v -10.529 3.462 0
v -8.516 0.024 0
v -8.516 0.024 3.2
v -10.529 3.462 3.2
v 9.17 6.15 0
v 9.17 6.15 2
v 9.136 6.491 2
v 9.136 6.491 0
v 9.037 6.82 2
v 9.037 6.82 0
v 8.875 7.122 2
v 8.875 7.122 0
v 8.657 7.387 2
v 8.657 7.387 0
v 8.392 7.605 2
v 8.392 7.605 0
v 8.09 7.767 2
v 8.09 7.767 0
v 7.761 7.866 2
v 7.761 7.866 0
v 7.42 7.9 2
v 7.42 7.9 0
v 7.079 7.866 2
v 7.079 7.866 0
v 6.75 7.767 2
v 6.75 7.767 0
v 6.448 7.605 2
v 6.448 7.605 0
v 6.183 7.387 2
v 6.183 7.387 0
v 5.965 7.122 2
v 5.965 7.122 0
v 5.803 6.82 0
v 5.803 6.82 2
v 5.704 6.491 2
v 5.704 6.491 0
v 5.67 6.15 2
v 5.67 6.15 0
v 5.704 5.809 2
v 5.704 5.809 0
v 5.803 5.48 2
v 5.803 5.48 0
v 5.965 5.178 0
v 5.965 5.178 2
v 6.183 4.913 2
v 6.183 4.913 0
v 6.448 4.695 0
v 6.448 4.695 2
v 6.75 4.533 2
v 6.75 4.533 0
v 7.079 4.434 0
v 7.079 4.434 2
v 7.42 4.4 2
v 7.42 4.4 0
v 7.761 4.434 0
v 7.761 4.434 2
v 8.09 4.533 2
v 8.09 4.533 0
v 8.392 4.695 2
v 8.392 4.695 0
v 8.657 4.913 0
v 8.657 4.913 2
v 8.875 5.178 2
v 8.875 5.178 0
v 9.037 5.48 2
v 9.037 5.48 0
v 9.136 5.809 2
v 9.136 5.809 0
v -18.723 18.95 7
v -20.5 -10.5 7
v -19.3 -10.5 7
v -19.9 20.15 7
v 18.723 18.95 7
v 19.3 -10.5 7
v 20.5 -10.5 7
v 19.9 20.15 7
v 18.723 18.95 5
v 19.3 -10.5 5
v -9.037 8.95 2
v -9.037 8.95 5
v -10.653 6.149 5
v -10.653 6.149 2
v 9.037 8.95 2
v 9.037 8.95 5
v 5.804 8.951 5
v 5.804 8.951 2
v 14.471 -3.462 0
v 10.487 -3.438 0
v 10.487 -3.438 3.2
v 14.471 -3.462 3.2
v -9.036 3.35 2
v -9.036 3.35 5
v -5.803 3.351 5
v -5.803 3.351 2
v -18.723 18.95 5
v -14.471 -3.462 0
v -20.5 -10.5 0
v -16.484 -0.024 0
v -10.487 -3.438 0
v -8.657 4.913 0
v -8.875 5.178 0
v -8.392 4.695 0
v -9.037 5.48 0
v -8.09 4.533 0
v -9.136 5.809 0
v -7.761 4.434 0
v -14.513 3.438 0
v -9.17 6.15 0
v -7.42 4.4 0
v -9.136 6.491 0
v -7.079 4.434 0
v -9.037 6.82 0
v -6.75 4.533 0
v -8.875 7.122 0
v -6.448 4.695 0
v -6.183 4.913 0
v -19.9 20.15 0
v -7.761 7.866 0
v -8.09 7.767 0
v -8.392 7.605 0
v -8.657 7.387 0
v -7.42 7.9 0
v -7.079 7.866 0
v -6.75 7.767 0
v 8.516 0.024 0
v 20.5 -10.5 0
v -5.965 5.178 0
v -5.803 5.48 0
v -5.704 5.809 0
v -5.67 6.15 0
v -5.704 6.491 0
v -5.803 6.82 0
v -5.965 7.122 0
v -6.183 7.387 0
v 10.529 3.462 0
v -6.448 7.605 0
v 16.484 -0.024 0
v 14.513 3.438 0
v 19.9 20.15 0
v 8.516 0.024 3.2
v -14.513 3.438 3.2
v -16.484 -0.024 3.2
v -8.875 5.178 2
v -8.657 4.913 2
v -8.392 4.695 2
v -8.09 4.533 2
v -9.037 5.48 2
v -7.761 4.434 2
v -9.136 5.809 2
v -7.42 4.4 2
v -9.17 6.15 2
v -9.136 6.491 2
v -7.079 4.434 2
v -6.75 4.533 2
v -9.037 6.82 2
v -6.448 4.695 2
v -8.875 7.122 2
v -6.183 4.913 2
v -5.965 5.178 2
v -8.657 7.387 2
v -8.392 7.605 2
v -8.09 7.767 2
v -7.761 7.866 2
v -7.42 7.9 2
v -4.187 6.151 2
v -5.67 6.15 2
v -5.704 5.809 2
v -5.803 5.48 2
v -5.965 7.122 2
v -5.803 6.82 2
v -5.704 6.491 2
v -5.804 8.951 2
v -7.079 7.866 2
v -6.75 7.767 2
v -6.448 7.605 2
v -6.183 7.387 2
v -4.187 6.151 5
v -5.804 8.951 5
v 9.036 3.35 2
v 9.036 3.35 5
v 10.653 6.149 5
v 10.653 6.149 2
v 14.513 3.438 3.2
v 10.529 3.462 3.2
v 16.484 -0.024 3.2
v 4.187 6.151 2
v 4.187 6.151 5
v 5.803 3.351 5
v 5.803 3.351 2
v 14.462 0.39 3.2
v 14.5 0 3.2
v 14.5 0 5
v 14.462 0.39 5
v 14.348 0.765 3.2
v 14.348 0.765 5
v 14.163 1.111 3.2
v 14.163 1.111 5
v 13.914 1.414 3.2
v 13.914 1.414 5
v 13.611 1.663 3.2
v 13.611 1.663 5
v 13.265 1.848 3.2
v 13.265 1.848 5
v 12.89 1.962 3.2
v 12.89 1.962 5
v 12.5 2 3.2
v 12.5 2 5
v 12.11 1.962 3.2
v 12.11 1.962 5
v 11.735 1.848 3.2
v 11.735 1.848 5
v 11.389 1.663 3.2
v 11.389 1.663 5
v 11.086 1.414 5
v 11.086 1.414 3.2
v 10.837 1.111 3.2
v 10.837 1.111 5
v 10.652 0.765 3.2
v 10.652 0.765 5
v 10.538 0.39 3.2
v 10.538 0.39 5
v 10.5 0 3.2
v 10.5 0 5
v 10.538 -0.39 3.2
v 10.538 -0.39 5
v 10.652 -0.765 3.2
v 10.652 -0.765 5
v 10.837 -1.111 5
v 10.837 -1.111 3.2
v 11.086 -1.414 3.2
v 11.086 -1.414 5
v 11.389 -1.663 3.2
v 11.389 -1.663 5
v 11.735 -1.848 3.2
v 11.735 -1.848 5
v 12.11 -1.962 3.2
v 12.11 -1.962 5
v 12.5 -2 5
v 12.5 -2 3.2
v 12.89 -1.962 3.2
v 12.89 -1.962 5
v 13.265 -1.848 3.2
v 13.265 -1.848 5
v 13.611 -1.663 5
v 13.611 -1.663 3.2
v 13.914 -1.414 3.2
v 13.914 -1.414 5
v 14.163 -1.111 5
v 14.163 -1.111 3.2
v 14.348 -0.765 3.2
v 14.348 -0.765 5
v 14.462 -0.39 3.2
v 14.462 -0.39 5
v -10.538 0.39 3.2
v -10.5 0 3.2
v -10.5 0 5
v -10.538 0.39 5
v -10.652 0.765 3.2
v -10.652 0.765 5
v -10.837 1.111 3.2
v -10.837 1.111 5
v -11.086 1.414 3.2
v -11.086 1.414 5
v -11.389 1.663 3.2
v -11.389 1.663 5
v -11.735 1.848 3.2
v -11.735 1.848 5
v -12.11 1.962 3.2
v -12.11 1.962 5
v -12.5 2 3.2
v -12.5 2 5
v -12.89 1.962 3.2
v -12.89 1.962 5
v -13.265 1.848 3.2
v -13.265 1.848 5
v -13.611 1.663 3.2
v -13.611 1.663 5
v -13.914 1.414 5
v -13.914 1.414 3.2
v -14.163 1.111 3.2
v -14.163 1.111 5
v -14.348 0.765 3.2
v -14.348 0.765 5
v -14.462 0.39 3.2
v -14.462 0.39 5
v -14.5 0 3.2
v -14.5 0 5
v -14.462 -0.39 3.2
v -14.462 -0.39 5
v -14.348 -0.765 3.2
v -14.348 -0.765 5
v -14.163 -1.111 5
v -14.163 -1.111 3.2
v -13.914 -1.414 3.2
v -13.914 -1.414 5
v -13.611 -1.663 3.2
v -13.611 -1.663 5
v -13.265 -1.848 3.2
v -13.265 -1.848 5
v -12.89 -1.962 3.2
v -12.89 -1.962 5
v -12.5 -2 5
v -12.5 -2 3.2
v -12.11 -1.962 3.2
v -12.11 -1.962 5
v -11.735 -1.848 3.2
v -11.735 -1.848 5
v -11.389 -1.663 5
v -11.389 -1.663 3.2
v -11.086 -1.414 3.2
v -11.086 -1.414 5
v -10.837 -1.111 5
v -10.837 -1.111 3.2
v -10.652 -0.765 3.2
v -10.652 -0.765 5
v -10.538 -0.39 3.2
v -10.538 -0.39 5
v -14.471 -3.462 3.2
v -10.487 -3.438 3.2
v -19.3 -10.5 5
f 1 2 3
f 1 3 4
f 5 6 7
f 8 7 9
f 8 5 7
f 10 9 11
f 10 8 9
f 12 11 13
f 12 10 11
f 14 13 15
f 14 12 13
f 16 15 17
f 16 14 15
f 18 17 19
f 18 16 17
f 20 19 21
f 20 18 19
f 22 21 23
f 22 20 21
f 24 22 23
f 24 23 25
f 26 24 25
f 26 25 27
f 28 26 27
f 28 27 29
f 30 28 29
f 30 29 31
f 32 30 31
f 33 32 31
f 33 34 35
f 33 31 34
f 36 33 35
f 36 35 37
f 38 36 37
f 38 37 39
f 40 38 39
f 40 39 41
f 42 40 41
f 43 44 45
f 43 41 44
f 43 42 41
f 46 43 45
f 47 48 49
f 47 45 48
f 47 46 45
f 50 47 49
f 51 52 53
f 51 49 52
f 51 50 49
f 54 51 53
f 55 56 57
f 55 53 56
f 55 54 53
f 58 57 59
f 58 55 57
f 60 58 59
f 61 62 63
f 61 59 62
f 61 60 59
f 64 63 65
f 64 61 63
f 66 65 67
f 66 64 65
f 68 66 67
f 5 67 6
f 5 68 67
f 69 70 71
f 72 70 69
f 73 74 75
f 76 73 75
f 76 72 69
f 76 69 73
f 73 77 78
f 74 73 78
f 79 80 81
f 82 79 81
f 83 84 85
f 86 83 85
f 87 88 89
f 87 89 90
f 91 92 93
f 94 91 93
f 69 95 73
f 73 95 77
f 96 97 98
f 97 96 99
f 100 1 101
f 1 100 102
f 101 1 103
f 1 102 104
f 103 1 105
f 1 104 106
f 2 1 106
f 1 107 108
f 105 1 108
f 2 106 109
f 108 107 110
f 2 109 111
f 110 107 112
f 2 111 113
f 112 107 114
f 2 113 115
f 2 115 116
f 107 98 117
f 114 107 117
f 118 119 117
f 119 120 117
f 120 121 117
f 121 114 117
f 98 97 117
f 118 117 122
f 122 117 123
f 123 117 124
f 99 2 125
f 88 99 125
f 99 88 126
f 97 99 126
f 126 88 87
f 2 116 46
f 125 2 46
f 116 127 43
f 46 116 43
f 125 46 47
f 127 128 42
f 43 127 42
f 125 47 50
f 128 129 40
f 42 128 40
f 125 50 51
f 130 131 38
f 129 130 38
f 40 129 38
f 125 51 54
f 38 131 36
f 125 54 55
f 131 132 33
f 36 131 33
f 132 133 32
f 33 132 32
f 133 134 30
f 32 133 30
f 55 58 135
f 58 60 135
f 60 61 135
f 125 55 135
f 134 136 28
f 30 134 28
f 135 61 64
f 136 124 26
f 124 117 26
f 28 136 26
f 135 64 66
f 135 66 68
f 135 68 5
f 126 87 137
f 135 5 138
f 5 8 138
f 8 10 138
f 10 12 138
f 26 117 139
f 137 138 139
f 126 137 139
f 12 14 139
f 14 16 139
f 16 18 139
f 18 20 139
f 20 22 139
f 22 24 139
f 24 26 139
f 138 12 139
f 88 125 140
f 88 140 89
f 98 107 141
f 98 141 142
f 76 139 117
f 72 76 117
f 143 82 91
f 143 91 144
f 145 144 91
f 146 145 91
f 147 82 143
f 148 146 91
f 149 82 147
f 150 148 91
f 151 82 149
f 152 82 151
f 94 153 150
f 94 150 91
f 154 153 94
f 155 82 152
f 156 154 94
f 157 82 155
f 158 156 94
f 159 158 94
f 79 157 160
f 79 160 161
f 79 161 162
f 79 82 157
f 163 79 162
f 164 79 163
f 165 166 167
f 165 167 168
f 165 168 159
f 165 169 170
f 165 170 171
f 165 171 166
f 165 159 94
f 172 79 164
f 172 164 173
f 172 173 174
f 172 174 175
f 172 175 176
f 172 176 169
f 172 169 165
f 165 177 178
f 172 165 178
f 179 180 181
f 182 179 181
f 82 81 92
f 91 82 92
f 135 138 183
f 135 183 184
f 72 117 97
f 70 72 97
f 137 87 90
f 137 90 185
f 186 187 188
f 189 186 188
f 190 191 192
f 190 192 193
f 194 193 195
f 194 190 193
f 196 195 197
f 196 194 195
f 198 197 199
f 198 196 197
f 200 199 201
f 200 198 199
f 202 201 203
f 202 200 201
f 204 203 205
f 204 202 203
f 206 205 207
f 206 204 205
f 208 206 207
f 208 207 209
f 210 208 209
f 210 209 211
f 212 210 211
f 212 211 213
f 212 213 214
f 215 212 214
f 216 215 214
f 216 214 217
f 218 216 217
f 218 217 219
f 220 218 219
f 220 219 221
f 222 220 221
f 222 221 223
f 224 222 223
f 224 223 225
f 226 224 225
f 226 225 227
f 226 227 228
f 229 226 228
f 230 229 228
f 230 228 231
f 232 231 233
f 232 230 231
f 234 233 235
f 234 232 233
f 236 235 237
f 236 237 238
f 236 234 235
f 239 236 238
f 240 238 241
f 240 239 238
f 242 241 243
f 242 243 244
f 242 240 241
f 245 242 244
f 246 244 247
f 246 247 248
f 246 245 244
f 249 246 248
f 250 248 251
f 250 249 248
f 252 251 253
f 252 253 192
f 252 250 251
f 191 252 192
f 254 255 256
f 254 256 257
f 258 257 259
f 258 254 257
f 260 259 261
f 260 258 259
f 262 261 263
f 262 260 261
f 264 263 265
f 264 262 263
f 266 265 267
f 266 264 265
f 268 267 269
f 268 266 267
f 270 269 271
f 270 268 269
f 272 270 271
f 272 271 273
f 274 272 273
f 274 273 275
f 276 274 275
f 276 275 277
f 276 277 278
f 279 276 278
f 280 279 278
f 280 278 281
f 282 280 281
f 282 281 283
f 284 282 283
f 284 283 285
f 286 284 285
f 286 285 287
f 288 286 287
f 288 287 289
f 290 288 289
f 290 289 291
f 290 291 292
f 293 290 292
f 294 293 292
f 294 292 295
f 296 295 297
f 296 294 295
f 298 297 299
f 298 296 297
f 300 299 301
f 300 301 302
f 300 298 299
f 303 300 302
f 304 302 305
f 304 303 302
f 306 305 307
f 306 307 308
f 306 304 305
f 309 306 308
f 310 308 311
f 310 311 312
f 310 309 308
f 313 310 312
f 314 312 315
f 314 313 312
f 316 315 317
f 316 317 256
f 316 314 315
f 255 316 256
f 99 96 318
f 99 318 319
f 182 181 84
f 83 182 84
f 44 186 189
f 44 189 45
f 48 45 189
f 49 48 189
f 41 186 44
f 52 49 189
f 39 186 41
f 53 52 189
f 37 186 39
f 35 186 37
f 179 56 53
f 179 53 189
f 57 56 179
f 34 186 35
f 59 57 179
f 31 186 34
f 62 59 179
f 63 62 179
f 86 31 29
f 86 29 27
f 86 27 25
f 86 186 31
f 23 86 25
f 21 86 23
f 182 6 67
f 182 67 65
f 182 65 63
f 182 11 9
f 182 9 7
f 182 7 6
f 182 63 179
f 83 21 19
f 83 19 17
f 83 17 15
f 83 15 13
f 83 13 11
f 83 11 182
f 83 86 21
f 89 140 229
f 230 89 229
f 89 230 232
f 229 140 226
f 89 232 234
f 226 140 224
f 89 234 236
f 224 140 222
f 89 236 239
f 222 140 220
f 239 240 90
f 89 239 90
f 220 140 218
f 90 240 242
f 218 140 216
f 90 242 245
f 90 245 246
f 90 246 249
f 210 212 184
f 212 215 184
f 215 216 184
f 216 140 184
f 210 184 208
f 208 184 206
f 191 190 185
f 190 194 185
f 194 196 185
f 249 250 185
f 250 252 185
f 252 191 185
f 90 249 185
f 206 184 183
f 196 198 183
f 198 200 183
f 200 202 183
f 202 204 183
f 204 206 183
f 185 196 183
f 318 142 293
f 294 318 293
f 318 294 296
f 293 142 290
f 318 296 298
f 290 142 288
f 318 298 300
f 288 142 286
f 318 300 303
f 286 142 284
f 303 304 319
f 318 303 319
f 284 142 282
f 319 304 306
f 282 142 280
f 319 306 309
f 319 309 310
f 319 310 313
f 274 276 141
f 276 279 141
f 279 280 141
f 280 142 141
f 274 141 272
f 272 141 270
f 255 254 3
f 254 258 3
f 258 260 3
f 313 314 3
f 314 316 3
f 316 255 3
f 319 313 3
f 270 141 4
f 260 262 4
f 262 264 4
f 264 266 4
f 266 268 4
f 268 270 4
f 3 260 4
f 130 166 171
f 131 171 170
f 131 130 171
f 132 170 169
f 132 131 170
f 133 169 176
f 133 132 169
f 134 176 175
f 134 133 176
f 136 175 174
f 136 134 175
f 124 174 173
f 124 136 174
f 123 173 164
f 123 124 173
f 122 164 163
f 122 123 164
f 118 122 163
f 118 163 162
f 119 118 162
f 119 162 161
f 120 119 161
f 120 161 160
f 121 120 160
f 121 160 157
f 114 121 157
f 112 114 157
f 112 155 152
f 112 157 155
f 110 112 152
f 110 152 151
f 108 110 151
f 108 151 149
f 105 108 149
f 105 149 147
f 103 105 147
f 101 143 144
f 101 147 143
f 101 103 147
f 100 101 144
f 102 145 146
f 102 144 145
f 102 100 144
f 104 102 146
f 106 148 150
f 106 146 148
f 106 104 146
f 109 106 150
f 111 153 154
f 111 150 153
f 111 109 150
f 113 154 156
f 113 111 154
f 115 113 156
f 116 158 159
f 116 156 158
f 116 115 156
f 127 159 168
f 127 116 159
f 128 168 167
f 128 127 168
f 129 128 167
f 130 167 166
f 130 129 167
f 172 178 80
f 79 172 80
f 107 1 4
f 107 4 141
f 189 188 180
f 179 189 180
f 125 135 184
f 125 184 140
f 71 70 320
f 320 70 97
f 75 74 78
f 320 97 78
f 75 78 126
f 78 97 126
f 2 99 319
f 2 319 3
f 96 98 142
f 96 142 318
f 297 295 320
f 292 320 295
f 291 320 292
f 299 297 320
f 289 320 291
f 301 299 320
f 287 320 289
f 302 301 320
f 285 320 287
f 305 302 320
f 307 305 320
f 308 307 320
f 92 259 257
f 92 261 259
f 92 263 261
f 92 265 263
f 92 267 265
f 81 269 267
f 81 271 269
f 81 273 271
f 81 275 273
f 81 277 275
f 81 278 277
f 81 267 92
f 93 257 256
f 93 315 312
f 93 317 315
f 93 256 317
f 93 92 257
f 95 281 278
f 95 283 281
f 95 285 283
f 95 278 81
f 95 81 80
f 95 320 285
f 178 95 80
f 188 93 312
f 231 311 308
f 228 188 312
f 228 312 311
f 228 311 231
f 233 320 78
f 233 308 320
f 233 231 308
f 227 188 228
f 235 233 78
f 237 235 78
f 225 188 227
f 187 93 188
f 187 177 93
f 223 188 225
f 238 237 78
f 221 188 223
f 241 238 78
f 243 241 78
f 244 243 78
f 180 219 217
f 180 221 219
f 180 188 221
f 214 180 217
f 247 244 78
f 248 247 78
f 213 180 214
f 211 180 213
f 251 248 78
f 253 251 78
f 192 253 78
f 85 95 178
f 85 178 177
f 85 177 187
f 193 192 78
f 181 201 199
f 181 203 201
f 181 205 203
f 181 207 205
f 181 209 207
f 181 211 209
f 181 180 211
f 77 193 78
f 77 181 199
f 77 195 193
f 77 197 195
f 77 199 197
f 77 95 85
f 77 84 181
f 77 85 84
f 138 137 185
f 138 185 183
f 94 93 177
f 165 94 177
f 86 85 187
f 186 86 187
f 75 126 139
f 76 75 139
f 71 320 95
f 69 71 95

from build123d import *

# Parameters (mm, degrees)
F0_R     = 2
F0_R_2   = 1.75
F1_DEPTH = 5
F2_DEPTH = 7
F3_DEPTH = 3.2
F5_DEPTH = 3


with BuildPart() as f1:
    # F0 (on Top) → F1 (new body)
    with BuildSketch(Plane.XY):
        Polygon((0, -10.5), (19.29977, -10.5), (18.723261, 18.95), (0, 18.95), (-18.723261, 18.95), (-19.29977, -10.5), align=None)
        Polygon((-14.47088, -3.462027), (-16.483643, -0.024181), (-14.512763, 3.437846), (-10.52912, 3.462027), (-8.516357, 0.024181), (-10.487237, -3.437846), align=None, mode=Mode.SUBTRACT)
        Polygon((14.512763, 3.437846), (16.483643, -0.024181), (14.47088, -3.462027), (10.487237, -3.437846), (8.516357, 0.024181), (10.52912, 3.462027), align=None, mode=Mode.SUBTRACT)
        with Locations((-7.42, 6.15)):
            Circle(F0_R_2, mode=Mode.SUBTRACT)
        with Locations((7.42, 6.15)):
            Circle(F0_R_2, mode=Mode.SUBTRACT)
        Polygon((-14.512763, 3.437846), (-16.483643, -0.024181), (-14.47088, -3.462027), (-10.487237, -3.437846), (-8.516357, 0.024181), (-10.52912, 3.462027), align=None)
        with Locations((-12.5, 0)):
            Circle(F0_R, mode=Mode.SUBTRACT)
        Polygon((14.47088, -3.462027), (16.483643, -0.024181), (14.512763, 3.437846), (10.52912, 3.462027), (8.516357, 0.024181), (10.487237, -3.437846), align=None)
        with Locations((12.5, 0)):
            Circle(F0_R, mode=Mode.SUBTRACT)
    extrude(amount=F1_DEPTH)

    # F0 (on Top) → F2 (join)
    with BuildSketch(Plane.XY):
        Polygon((19.9, 20.15), (0, 20.15), (-19.9, 20.15), (-20.5, -10.5), (-19.29977, -10.5), (-18.723261, 18.95), (0, 18.95), (18.723261, 18.95), (19.29977, -10.5), (20.5, -10.5), align=None)
    extrude(amount=F2_DEPTH)

    # F0 (on Top) → F3 (cut)
    with BuildSketch(Plane.XY):
        Polygon((14.47088, -3.462027), (16.483643, -0.024181), (14.512763, 3.437846), (10.52912, 3.462027), (8.516357, 0.024181), (10.487237, -3.437846), align=None)
        with Locations((12.5, 0)):
            Circle(F0_R, mode=Mode.SUBTRACT)
        Polygon((-14.512763, 3.437846), (-16.483643, -0.024181), (-14.47088, -3.462027), (-10.487237, -3.437846), (-8.516357, 0.024181), (-10.52912, 3.462027), align=None)
        with Locations((-12.5, 0)):
            Circle(F0_R, mode=Mode.SUBTRACT)
    extrude(amount=F3_DEPTH, mode=Mode.SUBTRACT)

    # F4 (on face) → F5 (cut)
    with BuildSketch(Plane.XY.offset(5)):
        Polygon((10.653188, 6.14902), (9.03747, 8.949517), (5.804308, 8.950513), (4.186865, 6.15101), (5.802584, 3.350513), (9.035746, 3.349518), align=None)
        Polygon((-4.186865, 6.15101), (-5.804308, 8.950513), (-9.03747, 8.949517), (-10.653188, 6.14902), (-9.035746, 3.349518), (-5.802584, 3.350513), align=None)
    extrude(amount=-F5_DEPTH, mode=Mode.SUBTRACT)


solid = f1.part
